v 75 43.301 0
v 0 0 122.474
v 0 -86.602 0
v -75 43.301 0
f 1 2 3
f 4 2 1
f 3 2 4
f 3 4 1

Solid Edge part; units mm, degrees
sketch "Sketch1" plane through (0, 0, 0) normal (0, 0, 1) x (1, 0, 0)
  line L0 (0, -86.6025) -> (75, 43.3013)
  line L1 (75, 43.3013) -> (-75, 43.3013)
  line L2 (-75, 43.3013) -> (0, -86.6025)
extrude "Protrusion1" add sketch "Sketch1" along normal up to vertex (122.4745 mm away)
sketch "Sketch2" plane through (0, 0, 0) normal (1, 0, 0) x (0, 1, 0)
  line L0 (0, 122.4745) -> (43.3013, 0)
extrude "Cutout1" cut sketch "Sketch2" along normal mid plane 491.8403 material side at (0, 21.6978, 61.2539)
pattern_circular "Pattern1" count 3 over 360 about axis through (0, 0, 122.4745) along (0, 0, -1) of "Cutout1"
